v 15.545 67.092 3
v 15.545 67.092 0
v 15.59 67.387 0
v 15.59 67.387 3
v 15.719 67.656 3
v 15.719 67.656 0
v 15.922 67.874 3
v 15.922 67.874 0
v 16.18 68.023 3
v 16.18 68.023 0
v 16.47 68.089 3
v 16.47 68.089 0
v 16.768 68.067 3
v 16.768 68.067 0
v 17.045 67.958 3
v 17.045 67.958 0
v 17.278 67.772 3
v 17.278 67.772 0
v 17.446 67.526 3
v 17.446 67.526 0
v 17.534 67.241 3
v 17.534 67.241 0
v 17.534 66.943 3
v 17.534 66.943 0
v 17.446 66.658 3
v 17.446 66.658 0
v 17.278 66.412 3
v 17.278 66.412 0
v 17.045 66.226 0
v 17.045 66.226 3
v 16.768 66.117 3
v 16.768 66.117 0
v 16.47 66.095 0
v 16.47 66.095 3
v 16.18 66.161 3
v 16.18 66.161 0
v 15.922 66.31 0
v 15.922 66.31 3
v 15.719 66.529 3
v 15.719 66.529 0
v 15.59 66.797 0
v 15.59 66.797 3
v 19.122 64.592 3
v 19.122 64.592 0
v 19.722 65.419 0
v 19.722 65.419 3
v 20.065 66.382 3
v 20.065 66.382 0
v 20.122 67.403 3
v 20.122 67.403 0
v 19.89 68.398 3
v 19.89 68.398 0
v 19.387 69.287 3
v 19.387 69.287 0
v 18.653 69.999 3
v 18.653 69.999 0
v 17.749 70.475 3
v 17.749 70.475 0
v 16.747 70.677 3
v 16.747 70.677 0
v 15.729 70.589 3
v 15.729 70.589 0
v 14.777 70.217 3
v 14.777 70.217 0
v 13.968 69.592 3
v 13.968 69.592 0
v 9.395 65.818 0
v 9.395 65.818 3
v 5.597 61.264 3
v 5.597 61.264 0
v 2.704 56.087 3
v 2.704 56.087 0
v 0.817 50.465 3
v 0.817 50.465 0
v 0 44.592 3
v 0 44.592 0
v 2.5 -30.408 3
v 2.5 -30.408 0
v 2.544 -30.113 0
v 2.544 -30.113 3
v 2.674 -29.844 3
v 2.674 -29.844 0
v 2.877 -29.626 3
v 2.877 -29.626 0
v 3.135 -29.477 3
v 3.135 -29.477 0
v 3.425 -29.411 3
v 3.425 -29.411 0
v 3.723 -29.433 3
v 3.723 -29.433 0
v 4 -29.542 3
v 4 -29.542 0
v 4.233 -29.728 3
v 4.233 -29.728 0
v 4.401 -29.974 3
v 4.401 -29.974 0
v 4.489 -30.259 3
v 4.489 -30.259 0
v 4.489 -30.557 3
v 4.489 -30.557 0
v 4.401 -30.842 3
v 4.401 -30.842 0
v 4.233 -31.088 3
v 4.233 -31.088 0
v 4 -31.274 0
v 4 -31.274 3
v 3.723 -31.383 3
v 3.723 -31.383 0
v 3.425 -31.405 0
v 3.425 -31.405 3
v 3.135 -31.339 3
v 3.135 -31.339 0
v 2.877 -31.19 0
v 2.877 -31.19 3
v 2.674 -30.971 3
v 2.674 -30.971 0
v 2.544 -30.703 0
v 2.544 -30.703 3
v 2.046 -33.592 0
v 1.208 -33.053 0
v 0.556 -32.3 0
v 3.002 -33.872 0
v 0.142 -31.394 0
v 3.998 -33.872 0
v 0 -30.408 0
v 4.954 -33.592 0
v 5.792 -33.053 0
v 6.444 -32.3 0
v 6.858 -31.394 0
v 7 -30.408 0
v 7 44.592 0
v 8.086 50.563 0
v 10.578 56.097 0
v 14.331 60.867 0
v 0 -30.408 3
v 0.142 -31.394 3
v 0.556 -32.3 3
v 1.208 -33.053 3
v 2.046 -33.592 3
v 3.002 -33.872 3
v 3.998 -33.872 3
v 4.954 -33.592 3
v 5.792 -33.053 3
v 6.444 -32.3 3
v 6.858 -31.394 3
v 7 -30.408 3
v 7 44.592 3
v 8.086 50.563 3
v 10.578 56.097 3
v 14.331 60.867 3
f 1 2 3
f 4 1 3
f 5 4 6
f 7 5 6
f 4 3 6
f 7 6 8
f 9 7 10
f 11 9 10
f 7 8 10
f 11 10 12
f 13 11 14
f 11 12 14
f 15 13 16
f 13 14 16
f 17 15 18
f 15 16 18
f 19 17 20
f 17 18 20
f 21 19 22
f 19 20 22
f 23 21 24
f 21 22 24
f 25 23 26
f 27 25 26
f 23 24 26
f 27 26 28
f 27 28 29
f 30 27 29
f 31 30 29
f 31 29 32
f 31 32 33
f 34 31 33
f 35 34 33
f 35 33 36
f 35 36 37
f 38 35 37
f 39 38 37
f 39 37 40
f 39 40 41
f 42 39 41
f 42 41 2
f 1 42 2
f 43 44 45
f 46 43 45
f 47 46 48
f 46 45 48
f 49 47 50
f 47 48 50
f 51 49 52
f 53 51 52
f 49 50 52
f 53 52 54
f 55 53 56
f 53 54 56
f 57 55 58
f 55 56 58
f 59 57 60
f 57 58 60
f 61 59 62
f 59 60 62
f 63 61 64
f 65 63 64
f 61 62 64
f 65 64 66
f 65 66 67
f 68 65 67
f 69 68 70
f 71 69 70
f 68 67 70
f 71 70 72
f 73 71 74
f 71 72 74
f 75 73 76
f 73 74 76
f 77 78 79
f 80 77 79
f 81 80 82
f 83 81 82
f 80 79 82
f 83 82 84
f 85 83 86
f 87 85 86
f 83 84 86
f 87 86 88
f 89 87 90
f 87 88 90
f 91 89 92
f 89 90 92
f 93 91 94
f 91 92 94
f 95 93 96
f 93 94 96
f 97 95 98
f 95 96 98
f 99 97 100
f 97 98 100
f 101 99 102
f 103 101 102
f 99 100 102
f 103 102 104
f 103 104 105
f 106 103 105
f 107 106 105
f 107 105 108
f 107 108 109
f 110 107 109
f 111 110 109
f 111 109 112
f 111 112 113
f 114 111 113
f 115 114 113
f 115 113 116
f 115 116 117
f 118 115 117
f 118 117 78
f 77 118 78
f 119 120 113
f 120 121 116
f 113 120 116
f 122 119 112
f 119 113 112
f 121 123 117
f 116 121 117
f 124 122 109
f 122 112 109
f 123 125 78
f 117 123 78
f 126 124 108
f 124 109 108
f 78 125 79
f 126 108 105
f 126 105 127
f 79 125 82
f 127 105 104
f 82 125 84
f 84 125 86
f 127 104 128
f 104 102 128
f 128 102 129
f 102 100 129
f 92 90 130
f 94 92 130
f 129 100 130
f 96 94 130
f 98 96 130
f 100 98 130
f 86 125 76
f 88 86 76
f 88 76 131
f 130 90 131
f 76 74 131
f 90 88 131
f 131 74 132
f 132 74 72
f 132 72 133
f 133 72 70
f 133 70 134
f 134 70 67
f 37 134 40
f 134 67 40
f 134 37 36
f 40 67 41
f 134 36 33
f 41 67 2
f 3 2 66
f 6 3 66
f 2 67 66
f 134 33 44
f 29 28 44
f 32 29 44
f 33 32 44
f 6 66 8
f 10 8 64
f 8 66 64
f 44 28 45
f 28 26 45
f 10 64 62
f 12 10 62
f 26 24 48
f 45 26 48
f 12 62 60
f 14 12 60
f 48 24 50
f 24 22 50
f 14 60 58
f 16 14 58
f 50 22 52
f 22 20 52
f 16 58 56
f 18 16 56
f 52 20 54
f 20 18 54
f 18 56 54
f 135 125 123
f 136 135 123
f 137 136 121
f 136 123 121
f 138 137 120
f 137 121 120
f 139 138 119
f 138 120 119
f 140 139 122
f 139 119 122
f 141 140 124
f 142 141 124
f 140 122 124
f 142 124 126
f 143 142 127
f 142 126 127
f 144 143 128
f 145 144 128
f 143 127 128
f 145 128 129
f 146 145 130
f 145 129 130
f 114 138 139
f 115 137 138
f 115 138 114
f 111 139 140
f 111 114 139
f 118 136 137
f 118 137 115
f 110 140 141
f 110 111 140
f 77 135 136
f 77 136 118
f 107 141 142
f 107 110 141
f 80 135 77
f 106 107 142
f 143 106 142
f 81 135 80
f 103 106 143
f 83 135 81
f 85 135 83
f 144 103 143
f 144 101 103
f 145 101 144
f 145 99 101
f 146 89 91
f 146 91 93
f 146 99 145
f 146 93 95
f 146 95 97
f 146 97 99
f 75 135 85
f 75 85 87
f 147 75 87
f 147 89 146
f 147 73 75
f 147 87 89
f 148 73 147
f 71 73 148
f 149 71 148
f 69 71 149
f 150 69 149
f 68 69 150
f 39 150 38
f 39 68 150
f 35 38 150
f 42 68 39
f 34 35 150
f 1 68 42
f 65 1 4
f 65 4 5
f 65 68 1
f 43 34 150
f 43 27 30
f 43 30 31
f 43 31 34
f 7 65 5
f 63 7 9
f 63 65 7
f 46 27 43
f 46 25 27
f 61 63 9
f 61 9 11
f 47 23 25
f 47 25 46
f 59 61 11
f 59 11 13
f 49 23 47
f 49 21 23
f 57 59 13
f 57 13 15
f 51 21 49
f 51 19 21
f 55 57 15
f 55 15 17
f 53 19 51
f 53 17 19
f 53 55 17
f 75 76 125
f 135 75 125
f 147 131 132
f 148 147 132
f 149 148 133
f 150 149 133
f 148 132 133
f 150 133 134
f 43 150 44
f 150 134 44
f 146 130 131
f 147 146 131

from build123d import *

# Parameters (mm, degrees)
BOSS_EXTRU_1_DEPTH            = 3
TROU_DE_PASSAGE_D_AXE_3_321_D = 2
TROU_DE_PASSAGE_D_AXE_3_322_D = 2


with BuildPart() as part:
    # Esquisse1 → Boss.-Extru.1 (new body)
    with BuildSketch(Plane.XY):
        with BuildLine():
            Line((0, 44.592200572), (0, -30.407799428))
            ThreePointArc((0, -30.407799428), (3.5, -33.907799428), (7, -30.407799428))
            Line((7, -30.407799428), (7, 44.592200572))
            ThreePointArc((7, 44.592200572), (10.5782573, 56.097095666), (19.122245191, 64.592200572))
            ThreePointArc((19.122245191, 64.592200572), (19.045221408, 69.669224354), (13.968197626, 69.592200572))
            ThreePointArc((13.968197626, 69.592200572), (4.030461038, 58.742480417), (0, 44.592200572))
        make_face()
    extrude(amount=BOSS_EXTRU_1_DEPTH)

    # Trou de passage d'axe 3/321 (through all)
    with Locations(Plane(origin=(16.545221408, 67.092200572, 3), x_dir=(1, 0, 0), z_dir=(0, 0, 1))):
        with Locations((0, 0)):
            Hole(TROU_DE_PASSAGE_D_AXE_3_321_D / 2)

    # Trou de passage d'axe 3/322 (through all)
    with Locations(Plane(origin=(3.5, -30.407799428, 3), x_dir=(1, 0, 0), z_dir=(0, 0, 1))):
        with Locations((0, 0)):
            Hole(TROU_DE_PASSAGE_D_AXE_3_322_D / 2)


solid = part.part
